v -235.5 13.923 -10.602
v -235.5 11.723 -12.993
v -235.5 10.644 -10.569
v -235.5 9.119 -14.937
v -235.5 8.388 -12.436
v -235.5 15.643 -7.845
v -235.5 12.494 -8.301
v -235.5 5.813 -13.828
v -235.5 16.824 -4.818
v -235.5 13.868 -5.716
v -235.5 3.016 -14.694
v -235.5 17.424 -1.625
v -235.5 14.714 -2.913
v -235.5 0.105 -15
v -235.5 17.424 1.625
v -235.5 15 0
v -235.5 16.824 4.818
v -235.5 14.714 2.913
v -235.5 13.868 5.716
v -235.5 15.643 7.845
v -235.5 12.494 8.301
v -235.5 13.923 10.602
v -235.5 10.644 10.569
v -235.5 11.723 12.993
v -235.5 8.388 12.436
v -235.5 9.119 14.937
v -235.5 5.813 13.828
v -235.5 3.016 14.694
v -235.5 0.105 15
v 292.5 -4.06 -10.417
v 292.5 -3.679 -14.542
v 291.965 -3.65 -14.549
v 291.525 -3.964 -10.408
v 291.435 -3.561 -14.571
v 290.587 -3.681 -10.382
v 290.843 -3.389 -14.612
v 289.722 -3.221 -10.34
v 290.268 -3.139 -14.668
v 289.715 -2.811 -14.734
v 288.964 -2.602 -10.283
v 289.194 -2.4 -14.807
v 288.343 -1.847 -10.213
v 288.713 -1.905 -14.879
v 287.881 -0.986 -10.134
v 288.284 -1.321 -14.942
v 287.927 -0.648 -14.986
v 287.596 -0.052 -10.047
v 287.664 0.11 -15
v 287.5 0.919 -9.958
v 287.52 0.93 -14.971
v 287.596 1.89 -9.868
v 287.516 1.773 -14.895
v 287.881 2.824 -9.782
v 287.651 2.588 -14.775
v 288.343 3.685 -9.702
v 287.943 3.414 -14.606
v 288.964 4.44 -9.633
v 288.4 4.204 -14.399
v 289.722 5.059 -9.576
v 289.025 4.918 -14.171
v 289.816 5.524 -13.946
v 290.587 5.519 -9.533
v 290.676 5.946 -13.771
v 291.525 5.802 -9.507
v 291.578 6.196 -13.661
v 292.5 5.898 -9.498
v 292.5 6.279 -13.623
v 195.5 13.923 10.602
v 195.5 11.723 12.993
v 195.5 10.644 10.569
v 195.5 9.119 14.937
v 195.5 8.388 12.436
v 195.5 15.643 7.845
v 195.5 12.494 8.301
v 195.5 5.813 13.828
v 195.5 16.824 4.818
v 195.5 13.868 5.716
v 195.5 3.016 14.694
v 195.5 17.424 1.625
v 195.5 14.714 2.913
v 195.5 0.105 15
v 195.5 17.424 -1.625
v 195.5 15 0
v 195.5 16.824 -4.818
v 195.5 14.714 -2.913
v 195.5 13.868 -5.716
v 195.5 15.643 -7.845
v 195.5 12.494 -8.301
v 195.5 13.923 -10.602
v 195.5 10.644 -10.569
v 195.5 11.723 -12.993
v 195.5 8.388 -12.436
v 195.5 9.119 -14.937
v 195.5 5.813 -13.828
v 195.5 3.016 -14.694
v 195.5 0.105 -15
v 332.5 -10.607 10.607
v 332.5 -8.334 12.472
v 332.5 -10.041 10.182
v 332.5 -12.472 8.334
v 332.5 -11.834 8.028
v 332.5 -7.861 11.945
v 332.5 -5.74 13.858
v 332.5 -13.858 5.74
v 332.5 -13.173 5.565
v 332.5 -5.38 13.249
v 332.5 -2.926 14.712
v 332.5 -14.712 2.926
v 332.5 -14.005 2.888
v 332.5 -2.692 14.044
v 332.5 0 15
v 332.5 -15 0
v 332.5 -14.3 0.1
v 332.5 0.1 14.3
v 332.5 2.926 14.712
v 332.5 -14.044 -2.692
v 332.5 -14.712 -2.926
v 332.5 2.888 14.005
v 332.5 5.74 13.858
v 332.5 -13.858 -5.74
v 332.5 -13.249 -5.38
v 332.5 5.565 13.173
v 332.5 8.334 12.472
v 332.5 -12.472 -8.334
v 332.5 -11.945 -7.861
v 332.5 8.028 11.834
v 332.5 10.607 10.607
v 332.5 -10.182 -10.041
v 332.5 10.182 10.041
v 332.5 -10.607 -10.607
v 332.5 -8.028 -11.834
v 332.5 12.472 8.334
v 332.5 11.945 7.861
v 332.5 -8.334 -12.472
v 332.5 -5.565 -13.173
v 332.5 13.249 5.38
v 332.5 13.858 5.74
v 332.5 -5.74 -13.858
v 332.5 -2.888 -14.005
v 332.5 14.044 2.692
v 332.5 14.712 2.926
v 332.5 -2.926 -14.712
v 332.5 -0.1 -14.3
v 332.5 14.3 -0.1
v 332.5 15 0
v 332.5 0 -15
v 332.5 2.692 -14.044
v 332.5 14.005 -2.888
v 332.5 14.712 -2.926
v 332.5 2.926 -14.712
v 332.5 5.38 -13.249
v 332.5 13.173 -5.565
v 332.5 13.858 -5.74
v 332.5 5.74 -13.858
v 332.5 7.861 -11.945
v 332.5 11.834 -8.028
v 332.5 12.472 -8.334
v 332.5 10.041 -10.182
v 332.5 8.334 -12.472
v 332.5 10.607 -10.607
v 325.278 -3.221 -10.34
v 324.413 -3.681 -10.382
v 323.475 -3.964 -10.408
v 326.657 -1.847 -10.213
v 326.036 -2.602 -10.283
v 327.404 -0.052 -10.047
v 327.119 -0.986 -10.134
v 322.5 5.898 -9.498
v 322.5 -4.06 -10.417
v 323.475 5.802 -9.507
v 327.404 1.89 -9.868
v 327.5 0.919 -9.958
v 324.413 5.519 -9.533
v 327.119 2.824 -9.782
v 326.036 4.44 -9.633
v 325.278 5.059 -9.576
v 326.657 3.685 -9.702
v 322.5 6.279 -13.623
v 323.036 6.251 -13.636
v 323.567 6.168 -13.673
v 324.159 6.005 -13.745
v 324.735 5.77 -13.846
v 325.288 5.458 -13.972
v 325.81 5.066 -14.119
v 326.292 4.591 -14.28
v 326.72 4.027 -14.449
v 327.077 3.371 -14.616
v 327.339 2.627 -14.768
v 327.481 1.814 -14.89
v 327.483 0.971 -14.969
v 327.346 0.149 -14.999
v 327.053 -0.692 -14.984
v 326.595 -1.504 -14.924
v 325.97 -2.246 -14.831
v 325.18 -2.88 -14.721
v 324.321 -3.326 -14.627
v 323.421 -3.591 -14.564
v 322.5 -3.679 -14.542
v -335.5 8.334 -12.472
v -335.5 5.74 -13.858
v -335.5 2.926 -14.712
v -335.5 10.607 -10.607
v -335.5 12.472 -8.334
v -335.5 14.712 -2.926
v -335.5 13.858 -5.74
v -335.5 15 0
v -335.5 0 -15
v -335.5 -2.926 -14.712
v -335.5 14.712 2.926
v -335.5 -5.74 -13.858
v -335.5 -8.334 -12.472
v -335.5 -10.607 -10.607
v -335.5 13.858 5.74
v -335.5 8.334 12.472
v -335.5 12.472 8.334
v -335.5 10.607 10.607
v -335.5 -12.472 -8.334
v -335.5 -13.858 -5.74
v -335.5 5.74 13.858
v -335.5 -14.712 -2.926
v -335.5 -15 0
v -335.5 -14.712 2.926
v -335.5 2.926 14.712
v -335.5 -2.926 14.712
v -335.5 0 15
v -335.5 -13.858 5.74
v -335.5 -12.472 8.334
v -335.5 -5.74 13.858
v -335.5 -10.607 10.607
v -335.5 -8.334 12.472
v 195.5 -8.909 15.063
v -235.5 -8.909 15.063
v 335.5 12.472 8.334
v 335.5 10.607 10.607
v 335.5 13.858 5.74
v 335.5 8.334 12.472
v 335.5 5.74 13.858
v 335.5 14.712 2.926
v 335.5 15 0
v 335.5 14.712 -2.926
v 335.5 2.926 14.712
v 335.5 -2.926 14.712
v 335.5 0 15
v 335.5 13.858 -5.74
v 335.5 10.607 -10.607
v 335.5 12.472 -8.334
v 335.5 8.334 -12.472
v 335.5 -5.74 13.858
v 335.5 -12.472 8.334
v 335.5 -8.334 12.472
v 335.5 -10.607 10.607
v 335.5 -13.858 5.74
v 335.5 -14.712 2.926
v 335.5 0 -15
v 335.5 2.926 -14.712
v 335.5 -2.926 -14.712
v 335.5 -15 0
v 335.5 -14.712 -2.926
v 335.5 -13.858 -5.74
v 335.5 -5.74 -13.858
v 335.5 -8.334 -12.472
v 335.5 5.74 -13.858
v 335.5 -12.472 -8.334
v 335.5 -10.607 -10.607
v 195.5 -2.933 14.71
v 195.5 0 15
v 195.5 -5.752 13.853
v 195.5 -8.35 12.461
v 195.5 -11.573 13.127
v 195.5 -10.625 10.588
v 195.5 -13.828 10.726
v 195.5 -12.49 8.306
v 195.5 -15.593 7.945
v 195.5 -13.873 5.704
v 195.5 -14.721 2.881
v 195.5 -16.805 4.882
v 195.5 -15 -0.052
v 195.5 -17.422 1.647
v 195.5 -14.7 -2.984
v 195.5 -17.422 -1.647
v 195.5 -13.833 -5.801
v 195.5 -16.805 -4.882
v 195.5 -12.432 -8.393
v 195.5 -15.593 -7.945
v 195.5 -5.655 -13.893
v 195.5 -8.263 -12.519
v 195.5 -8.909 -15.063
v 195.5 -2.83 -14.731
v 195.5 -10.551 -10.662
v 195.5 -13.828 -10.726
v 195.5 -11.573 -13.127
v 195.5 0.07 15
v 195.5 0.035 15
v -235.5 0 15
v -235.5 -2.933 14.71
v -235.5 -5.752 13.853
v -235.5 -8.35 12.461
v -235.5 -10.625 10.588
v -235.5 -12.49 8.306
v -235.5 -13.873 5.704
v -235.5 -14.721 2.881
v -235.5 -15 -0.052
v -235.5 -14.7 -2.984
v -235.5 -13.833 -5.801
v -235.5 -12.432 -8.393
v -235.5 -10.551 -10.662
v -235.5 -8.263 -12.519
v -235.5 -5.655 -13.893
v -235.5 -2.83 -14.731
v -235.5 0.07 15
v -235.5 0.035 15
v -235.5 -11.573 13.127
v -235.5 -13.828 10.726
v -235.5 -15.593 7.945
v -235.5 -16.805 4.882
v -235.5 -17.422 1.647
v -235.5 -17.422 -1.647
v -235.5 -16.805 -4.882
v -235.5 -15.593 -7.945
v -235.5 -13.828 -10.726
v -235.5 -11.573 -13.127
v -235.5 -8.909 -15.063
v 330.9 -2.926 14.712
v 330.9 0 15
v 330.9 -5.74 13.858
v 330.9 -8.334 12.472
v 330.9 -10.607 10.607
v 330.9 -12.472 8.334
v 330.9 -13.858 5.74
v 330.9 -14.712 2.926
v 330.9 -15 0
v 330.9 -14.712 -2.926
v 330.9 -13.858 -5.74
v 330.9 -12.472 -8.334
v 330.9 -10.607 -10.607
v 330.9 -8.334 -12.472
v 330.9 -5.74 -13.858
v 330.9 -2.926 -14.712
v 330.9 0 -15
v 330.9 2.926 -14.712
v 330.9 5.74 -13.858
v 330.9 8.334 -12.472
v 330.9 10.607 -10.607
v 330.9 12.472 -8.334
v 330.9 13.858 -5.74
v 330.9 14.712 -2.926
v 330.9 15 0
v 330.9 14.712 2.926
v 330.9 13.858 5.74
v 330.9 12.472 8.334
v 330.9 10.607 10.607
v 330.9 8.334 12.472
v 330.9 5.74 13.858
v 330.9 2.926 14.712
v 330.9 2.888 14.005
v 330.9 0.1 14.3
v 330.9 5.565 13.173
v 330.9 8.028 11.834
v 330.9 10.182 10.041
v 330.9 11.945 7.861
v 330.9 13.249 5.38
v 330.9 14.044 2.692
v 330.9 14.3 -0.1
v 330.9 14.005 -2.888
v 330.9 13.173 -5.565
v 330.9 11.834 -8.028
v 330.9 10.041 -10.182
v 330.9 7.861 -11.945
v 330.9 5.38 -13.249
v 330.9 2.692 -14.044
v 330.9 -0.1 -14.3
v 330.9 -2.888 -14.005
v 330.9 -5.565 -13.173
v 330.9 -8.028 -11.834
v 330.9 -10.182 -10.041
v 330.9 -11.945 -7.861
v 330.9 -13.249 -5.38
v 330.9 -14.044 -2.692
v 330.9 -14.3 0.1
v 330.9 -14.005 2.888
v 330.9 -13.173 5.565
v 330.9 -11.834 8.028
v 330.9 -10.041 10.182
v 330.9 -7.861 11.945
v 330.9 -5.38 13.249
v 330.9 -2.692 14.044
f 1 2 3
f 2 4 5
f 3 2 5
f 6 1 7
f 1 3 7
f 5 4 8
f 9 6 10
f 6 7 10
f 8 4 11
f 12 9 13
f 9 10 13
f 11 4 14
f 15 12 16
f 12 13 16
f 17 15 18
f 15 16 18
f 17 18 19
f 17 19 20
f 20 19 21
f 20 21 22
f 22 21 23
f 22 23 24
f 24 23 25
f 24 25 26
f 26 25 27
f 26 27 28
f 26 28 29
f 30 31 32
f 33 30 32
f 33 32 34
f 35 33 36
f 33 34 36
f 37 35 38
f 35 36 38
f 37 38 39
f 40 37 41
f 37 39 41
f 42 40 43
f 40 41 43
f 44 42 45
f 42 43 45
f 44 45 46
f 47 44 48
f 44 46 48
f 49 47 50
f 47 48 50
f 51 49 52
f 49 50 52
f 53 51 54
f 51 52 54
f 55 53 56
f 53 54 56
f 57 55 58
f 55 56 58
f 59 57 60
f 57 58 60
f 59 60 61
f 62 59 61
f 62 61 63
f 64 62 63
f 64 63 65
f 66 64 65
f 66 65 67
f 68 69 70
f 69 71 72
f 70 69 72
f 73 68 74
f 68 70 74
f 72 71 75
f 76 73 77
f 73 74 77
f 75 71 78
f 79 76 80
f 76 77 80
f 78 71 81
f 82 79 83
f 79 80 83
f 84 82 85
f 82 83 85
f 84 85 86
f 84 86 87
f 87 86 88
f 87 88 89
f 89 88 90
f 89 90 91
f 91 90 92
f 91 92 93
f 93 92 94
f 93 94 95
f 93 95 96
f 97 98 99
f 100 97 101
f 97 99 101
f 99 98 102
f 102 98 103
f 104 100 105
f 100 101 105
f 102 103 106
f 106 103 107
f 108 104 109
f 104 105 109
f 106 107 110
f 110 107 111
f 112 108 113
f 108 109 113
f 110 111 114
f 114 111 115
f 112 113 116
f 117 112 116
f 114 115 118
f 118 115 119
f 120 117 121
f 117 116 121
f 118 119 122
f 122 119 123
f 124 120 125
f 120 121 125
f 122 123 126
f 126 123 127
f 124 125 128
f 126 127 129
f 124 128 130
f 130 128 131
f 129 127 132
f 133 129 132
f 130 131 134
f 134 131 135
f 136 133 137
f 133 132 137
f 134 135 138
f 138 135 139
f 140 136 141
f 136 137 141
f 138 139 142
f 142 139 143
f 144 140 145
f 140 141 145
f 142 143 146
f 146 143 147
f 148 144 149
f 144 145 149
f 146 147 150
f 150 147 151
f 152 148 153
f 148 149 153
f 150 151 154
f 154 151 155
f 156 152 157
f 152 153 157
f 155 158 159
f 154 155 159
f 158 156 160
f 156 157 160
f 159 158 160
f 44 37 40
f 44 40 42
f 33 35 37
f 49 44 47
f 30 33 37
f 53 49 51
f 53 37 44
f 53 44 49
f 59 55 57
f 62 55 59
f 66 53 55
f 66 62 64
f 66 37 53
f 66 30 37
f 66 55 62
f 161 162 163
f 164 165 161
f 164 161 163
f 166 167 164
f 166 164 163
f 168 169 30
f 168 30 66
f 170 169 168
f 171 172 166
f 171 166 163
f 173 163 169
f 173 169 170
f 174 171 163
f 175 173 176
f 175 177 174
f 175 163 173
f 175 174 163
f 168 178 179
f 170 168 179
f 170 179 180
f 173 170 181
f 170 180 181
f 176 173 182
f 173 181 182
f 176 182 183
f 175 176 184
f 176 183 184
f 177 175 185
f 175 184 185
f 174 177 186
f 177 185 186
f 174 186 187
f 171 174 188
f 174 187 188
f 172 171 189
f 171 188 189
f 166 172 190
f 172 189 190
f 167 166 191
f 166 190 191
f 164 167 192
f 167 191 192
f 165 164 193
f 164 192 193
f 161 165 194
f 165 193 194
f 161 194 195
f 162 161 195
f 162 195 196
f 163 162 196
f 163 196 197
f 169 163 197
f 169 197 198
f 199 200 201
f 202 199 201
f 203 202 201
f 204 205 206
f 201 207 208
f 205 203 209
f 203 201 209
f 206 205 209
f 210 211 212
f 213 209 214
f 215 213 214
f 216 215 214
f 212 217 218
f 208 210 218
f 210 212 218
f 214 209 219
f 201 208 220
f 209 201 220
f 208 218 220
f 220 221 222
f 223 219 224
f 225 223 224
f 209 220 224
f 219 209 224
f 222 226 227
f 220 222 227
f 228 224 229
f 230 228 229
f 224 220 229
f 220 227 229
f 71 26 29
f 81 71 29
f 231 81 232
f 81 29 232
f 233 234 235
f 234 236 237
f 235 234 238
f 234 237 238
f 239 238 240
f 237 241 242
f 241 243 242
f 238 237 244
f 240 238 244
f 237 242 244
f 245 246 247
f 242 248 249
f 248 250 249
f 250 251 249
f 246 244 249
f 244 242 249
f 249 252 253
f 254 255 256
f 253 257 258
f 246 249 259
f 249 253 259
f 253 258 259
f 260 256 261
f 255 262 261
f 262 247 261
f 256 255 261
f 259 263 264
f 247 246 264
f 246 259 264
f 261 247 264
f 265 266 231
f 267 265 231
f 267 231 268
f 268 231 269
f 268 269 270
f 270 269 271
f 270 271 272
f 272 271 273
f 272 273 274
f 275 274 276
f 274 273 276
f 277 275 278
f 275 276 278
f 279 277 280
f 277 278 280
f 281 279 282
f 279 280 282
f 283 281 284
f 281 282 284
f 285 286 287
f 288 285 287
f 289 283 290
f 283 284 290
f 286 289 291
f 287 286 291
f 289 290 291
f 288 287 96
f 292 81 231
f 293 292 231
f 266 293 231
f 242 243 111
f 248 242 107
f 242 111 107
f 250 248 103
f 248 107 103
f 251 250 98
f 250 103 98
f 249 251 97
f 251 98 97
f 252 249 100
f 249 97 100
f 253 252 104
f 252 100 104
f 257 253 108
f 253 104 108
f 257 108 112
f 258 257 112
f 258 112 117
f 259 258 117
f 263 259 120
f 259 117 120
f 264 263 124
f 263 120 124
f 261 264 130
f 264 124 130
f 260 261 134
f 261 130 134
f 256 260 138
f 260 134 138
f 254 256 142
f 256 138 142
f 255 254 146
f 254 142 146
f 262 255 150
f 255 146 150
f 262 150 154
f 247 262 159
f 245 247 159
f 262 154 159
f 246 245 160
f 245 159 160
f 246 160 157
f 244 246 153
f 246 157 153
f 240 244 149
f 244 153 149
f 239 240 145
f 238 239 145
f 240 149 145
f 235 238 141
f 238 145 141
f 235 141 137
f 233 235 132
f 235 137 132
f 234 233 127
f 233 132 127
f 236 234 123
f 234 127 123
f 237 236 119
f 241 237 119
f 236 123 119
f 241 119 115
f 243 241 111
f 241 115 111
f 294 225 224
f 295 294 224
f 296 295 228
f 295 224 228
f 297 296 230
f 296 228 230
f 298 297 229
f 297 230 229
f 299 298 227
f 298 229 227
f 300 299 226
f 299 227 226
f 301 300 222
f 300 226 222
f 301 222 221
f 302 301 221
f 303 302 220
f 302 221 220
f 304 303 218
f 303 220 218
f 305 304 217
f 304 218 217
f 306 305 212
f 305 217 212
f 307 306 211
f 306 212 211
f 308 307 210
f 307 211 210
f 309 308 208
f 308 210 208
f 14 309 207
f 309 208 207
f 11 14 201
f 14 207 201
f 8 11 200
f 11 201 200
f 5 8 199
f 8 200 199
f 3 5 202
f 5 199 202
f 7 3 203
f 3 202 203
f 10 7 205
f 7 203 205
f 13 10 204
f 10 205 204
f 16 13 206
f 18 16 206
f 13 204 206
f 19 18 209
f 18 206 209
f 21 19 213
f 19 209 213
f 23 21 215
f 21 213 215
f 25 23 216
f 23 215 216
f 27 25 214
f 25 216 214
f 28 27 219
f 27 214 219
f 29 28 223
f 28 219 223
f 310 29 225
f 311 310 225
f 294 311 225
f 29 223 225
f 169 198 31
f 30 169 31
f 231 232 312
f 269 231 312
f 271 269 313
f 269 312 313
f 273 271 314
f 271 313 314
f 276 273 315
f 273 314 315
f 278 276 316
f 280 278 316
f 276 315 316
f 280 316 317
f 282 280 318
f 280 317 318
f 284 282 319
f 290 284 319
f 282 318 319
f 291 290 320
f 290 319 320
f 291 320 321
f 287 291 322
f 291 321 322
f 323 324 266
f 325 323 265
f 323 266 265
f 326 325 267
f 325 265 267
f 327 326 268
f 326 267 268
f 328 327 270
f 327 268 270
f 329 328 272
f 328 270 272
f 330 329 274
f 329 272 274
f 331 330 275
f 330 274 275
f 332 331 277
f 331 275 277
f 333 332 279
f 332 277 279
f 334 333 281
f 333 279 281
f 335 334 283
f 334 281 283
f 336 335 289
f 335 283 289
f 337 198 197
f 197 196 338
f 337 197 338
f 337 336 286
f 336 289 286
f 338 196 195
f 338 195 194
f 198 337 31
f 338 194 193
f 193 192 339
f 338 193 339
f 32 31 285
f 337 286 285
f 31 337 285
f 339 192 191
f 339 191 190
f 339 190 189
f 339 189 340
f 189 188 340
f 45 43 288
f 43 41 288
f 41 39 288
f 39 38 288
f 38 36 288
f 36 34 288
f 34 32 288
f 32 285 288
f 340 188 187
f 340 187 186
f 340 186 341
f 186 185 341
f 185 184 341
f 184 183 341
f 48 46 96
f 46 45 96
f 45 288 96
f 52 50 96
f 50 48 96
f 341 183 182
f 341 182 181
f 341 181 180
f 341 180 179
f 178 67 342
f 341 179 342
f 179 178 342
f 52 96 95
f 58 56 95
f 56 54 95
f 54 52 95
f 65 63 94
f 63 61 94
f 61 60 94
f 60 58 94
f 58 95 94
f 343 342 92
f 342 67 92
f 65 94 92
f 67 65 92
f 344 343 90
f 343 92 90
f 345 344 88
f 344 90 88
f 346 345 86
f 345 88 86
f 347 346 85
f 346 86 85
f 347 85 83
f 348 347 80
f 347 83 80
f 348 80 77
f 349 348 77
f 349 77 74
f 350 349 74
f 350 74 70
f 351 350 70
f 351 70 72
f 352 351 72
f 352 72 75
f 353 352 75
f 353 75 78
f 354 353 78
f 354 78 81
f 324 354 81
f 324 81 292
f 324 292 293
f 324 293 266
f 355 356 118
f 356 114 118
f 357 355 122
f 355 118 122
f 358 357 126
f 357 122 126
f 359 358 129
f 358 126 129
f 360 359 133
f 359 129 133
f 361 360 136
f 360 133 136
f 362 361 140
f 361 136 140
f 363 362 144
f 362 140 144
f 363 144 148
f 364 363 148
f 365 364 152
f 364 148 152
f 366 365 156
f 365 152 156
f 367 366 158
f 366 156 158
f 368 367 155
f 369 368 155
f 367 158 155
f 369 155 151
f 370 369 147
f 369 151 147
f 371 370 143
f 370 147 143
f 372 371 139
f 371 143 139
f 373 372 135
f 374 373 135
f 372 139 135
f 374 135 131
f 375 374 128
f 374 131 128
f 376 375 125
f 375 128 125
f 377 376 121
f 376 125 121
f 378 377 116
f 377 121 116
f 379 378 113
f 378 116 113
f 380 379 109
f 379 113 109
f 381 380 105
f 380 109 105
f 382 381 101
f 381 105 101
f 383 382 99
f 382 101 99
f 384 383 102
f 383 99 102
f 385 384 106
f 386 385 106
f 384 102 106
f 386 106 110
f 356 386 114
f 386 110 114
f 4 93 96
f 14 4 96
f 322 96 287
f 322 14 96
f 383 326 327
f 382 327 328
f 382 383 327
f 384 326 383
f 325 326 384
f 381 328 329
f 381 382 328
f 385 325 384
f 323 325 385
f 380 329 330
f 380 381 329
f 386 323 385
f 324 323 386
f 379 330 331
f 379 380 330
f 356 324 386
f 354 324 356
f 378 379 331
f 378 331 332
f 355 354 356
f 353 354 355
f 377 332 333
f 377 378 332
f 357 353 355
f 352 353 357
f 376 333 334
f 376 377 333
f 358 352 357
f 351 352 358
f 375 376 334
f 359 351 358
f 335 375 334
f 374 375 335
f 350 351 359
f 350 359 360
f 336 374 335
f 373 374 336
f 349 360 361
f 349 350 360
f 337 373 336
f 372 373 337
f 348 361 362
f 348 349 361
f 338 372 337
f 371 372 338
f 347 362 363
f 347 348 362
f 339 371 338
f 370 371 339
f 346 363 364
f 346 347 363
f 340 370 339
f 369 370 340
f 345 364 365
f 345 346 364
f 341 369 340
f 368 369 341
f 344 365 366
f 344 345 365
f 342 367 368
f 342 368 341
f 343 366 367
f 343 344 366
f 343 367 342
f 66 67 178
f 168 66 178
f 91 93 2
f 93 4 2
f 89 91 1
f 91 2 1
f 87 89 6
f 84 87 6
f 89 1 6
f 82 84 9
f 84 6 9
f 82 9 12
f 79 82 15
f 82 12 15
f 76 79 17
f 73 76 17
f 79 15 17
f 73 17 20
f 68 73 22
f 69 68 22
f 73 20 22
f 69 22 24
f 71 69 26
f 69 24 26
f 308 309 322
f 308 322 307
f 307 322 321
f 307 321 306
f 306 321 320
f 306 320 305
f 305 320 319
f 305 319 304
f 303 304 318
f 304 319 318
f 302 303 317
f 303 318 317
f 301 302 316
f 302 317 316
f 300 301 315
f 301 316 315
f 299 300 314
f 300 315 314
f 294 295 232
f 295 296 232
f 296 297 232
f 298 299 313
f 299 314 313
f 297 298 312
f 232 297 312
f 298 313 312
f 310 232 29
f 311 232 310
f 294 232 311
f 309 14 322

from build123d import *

# Parameters (mm, degrees)
CUT_EXTRUDE1_DEPTH = 431
SKETCH3_W          = 1.6
SKETCH3_H          = 0.7
CUT_EXTRUDE2_DEPTH = 5


with BuildPart() as part:
    # Sketch1 → Revolve1 (revolve)
    with BuildSketch(Plane.XY, mode=Mode.PRIVATE) as revolve1_sk:
        Polygon((-335.5, 0), (335.5, 0), (335.5, 15), (195.5, 15), (195.5, 17.5), (-235.5, 17.5), (-235.5, 15), (-335.5, 15), align=None)
    revolve(revolve1_sk.sketch.rotate(Axis((-335.5, 0, 0), (1, 0, 0)), 90), axis=Axis((-335.5, 0, 0), (1, 0, 0)))

    # Sketch2 → Cut-Extrude1 (cut)
    with BuildSketch(Plane.ZY.offset(235.5)):
        with BuildLine():
            Line((-14.936600675, 9.118550338), (-15.062665819, -8.908765258))
            ThreePointArc((-15.062665819, -8.908765258), (-17.499572122, 0.12237463), (-14.936600675, 9.118550338))
        make_face()
        with BuildLine():
            Line((14.936600675, 9.118550338), (15.062665819, -8.908765258))
            ThreePointArc((15.062665819, -8.908765258), (17.499572122, 0.12237463), (14.936600675, 9.118550338))
        make_face()
    extrude(amount=-CUT_EXTRUDE1_DEPTH, mode=Mode.SUBTRACT)

    # Sketch3 → Cut-Revolve1 (revolve, cut)
    with BuildSketch(Plane(origin=(0, 0, 0), x_dir=(1, 0, 0), z_dir=(0, 1, 0)), mode=Mode.PRIVATE) as cut_revolve1_sk:
        with Locations((331.7, 14.65)):
            Rectangle(SKETCH3_W, SKETCH3_H)
    revolve(cut_revolve1_sk.sketch.rotate(Axis((335.5, 0, 0), (-1, 0, 0)), 180.400663256), axis=Axis((335.5, 0, 0), (-1, 0, 0)), mode=Mode.SUBTRACT)

    # Sketch6 → Cut-Extrude2 (cut)
    with BuildSketch(Plane(origin=(0, 1.378544902, -14.936519473), x_dir=(0, -0.9957679648377556, -0.09190299343804982), z_dir=(0, -0.09190299343804982, 0.9957679648377556))):
        with BuildLine():
            Line((5, 322.5), (5, 292.5))
            ThreePointArc((5, 292.5), (0, 287.5), (-5, 292.5))
            Line((-5, 292.5), (-5, 322.5))
            ThreePointArc((-5, 322.5), (0, 327.5), (5, 322.5))
        make_face()
    extrude(amount=CUT_EXTRUDE2_DEPTH, mode=Mode.SUBTRACT)


solid = part.part
